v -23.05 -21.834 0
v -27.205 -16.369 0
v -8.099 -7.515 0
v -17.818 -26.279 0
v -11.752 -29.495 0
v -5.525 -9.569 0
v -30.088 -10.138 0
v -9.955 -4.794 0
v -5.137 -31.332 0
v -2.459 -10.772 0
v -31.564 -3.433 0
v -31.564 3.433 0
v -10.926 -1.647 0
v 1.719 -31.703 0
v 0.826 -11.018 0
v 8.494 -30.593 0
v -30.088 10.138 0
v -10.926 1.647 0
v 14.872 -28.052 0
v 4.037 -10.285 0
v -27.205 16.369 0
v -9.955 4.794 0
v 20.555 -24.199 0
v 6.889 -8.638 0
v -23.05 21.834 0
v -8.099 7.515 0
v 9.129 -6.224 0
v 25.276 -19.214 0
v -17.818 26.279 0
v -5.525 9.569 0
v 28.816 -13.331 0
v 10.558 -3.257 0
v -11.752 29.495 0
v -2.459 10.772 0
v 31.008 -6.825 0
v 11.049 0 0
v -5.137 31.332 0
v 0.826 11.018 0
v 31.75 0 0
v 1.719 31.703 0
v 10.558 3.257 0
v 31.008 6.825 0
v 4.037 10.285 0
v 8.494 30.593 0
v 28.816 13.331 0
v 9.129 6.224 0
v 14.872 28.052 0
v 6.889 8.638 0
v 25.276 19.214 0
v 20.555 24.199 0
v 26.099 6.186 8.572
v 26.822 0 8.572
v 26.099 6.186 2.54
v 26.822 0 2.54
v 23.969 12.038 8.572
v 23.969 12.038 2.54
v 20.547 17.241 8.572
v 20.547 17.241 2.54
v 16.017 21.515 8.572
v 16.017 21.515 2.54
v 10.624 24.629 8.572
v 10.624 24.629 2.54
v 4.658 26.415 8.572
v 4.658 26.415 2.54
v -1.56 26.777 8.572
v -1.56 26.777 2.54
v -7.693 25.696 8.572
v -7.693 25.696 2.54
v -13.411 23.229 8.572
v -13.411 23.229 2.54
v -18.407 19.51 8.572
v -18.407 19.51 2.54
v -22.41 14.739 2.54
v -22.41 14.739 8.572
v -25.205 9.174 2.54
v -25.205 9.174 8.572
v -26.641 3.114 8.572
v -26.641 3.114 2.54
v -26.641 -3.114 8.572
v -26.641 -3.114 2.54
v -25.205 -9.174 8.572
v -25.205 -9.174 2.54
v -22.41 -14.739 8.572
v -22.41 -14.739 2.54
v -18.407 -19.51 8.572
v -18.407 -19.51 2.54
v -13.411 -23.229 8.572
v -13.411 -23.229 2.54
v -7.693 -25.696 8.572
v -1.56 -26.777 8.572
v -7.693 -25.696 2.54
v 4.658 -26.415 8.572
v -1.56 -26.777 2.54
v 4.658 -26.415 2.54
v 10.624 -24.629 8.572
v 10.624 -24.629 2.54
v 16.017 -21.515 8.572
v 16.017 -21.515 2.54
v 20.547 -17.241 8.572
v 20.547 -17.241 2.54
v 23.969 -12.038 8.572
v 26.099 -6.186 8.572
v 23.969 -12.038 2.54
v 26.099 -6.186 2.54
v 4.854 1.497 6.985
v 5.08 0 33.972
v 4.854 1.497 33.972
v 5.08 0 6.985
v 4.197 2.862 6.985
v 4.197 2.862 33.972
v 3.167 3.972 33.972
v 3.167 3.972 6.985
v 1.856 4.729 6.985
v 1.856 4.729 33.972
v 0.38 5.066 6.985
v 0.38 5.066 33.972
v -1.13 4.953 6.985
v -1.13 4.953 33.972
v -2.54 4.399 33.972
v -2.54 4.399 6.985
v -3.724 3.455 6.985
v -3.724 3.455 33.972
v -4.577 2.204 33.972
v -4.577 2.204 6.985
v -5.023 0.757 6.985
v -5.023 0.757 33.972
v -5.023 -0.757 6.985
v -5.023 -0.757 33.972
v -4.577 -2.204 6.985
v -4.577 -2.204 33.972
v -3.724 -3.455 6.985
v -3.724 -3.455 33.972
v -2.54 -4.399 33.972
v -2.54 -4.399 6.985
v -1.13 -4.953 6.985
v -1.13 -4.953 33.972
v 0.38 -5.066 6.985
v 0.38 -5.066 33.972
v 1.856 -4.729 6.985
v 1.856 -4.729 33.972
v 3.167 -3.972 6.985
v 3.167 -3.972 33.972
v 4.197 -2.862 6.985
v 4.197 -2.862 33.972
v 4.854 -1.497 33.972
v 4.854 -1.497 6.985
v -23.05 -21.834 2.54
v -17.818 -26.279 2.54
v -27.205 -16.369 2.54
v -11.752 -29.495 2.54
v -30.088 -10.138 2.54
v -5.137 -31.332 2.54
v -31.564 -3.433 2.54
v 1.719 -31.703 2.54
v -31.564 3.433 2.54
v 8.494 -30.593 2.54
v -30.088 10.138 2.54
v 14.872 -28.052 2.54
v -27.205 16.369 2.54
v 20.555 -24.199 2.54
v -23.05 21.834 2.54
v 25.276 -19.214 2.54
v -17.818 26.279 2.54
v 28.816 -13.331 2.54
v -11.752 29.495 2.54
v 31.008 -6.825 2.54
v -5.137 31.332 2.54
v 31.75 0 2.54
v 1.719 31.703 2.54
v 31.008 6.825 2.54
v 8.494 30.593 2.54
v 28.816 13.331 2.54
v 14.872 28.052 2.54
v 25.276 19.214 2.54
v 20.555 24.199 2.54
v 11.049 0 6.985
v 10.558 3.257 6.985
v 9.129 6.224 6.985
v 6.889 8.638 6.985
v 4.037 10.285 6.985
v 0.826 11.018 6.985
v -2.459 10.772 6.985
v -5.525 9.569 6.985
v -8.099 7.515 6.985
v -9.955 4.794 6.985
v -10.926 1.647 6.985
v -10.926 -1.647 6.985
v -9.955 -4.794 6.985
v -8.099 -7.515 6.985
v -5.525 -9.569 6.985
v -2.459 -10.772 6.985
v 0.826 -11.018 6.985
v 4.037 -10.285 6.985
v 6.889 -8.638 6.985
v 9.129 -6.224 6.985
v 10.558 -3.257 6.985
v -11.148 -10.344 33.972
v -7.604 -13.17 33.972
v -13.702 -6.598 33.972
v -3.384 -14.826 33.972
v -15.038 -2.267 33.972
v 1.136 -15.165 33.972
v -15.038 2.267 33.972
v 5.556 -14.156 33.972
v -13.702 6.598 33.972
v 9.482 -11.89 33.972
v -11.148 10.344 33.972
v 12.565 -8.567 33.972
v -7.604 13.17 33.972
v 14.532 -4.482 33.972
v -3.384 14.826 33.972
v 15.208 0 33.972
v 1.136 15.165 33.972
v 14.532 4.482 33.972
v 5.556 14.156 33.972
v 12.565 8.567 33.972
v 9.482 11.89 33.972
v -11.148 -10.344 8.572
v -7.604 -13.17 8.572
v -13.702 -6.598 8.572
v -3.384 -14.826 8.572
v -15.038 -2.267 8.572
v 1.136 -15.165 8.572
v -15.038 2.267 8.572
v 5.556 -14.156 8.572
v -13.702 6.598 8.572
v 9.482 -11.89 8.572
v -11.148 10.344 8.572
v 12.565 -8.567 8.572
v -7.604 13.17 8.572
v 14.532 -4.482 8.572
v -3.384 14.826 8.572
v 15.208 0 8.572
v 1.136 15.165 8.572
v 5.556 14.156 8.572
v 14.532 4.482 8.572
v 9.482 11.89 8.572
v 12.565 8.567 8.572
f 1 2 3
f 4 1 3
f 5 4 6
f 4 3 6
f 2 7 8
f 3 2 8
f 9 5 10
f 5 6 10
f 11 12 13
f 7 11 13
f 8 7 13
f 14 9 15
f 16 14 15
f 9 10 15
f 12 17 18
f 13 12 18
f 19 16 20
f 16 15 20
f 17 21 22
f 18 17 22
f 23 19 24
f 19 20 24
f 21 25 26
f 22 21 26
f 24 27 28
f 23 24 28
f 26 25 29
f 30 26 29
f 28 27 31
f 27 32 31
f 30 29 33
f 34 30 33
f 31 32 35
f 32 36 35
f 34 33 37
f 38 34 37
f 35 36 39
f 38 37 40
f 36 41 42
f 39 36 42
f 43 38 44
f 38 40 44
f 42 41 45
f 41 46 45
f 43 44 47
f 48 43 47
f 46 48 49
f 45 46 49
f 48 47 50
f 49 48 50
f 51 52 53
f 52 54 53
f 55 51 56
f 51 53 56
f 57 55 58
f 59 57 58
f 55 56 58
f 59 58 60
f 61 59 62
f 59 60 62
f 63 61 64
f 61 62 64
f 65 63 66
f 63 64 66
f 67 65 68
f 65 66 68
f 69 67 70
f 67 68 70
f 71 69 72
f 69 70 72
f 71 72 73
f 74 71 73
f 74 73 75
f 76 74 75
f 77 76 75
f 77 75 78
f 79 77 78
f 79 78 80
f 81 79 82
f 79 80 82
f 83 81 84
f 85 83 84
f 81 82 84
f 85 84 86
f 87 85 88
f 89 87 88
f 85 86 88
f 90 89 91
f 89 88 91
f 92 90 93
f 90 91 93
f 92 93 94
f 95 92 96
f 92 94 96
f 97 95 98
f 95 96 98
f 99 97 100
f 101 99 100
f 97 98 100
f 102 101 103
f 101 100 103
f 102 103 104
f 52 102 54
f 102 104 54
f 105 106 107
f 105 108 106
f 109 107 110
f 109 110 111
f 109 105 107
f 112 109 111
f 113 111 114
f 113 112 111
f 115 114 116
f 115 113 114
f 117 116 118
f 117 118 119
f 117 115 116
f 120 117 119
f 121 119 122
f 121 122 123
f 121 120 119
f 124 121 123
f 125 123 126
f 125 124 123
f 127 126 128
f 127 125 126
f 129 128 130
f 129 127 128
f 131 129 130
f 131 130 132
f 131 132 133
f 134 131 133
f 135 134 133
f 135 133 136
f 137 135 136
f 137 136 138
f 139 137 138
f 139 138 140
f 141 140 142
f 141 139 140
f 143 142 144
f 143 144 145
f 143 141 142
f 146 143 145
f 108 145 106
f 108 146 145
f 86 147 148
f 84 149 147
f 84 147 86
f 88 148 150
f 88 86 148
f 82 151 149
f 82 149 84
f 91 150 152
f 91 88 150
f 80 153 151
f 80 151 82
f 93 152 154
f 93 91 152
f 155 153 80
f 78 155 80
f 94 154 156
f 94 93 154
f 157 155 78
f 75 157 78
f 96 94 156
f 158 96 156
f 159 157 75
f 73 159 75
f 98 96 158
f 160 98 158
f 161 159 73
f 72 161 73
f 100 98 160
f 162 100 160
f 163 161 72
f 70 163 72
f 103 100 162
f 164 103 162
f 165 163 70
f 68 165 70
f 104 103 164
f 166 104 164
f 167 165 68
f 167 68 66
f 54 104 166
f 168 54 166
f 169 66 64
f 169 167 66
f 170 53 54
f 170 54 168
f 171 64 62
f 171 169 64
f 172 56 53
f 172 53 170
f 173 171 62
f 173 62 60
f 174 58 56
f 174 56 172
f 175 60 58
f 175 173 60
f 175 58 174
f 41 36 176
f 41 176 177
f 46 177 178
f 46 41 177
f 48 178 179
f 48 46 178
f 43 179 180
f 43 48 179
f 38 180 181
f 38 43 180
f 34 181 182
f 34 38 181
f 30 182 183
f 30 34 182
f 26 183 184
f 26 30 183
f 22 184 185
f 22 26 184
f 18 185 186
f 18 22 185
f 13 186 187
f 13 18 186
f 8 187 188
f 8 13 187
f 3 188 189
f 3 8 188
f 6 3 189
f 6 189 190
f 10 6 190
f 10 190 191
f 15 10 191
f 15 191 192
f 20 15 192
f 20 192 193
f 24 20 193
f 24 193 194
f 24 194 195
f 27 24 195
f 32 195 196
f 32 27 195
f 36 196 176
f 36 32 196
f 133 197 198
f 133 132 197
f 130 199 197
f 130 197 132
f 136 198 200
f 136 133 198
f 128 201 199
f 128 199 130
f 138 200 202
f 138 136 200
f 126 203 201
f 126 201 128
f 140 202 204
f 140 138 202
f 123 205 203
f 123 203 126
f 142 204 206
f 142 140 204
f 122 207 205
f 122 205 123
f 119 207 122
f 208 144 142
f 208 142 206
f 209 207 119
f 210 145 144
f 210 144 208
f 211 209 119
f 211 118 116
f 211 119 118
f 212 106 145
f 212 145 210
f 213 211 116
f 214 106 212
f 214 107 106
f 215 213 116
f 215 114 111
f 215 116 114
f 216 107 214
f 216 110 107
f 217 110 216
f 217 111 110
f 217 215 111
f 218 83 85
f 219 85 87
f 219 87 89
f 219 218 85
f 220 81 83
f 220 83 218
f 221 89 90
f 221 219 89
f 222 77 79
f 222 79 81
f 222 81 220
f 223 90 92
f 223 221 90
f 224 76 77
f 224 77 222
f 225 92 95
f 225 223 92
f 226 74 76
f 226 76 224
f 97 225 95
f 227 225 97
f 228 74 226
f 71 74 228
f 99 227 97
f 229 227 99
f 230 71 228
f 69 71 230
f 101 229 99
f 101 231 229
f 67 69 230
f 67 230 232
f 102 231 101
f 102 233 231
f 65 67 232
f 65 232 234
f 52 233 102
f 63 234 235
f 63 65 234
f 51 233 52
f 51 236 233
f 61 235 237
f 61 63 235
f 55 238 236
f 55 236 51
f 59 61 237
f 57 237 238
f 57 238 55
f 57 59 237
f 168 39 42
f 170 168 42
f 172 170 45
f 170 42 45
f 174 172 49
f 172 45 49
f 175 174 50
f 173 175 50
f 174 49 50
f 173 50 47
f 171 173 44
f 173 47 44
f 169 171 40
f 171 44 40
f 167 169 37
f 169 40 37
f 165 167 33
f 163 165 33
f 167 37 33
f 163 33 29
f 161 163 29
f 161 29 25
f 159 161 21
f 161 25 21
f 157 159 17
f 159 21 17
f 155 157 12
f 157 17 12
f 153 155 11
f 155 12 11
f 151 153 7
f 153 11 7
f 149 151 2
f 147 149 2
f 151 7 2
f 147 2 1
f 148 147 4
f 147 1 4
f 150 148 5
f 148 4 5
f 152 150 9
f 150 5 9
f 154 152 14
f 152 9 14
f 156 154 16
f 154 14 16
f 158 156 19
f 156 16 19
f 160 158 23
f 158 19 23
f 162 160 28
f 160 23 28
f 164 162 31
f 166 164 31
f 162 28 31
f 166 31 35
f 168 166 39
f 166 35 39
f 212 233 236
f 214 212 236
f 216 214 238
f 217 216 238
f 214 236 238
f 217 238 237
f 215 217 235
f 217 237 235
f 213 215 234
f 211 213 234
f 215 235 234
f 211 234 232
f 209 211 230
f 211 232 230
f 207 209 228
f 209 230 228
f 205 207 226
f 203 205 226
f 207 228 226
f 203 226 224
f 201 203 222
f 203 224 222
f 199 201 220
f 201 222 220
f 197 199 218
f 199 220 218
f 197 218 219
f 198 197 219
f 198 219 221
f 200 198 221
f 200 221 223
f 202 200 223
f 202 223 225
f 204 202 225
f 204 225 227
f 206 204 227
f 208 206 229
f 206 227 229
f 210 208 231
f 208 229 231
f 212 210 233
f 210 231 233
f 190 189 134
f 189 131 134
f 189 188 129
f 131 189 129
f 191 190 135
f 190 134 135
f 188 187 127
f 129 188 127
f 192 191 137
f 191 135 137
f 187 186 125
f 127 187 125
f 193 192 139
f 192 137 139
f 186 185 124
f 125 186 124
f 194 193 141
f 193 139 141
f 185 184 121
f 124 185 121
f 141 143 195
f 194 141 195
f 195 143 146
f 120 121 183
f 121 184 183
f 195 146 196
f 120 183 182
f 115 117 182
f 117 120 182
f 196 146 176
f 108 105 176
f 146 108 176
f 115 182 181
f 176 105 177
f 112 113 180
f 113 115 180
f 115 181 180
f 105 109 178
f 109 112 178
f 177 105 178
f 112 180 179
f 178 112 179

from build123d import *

# Parameters (mm, degrees)
F0_R     = 26.8224
F0_R_2   = 11.049
F1_DEPTH = 6.985
F0_R_3   = 31.75
F2_DEPTH = 2.54
F3_R     = 26.8224
F3_R_2   = 11.049
F3_R_3   = 5.08
F4_DEPTH = 1.5875
F5_R     = 15.207522
F5_R_2   = 5.08
F6_DEPTH = 25.4


with BuildPart() as f1:
    # F0 (on Top) → F1 (new body)
    with BuildSketch(Plane.XY):
        Circle(F0_R)
        Circle(F0_R_2, mode=Mode.SUBTRACT)
    extrude(amount=F1_DEPTH)

    # F0 (on Top) → F2 (join)
    with BuildSketch(Plane.XY):
        Circle(F0_R_3)
        Circle(F0_R, mode=Mode.SUBTRACT)
    extrude(amount=F2_DEPTH)

    # F3 (on face) → F4 (join)
    with BuildSketch(Plane.XY.offset(6.985)):
        Circle(F3_R)
        Circle(F3_R_2, mode=Mode.SUBTRACT)
        Circle(F3_R_2)
        Circle(F3_R_3, mode=Mode.SUBTRACT)
    extrude(amount=F4_DEPTH)

    # F5 (on face) → F6 (join)
    with BuildSketch(Plane.XY.offset(8.5725)):
        Circle(F5_R)
        Circle(F5_R_2, mode=Mode.SUBTRACT)
    extrude(amount=F6_DEPTH)


solid = f1.part
